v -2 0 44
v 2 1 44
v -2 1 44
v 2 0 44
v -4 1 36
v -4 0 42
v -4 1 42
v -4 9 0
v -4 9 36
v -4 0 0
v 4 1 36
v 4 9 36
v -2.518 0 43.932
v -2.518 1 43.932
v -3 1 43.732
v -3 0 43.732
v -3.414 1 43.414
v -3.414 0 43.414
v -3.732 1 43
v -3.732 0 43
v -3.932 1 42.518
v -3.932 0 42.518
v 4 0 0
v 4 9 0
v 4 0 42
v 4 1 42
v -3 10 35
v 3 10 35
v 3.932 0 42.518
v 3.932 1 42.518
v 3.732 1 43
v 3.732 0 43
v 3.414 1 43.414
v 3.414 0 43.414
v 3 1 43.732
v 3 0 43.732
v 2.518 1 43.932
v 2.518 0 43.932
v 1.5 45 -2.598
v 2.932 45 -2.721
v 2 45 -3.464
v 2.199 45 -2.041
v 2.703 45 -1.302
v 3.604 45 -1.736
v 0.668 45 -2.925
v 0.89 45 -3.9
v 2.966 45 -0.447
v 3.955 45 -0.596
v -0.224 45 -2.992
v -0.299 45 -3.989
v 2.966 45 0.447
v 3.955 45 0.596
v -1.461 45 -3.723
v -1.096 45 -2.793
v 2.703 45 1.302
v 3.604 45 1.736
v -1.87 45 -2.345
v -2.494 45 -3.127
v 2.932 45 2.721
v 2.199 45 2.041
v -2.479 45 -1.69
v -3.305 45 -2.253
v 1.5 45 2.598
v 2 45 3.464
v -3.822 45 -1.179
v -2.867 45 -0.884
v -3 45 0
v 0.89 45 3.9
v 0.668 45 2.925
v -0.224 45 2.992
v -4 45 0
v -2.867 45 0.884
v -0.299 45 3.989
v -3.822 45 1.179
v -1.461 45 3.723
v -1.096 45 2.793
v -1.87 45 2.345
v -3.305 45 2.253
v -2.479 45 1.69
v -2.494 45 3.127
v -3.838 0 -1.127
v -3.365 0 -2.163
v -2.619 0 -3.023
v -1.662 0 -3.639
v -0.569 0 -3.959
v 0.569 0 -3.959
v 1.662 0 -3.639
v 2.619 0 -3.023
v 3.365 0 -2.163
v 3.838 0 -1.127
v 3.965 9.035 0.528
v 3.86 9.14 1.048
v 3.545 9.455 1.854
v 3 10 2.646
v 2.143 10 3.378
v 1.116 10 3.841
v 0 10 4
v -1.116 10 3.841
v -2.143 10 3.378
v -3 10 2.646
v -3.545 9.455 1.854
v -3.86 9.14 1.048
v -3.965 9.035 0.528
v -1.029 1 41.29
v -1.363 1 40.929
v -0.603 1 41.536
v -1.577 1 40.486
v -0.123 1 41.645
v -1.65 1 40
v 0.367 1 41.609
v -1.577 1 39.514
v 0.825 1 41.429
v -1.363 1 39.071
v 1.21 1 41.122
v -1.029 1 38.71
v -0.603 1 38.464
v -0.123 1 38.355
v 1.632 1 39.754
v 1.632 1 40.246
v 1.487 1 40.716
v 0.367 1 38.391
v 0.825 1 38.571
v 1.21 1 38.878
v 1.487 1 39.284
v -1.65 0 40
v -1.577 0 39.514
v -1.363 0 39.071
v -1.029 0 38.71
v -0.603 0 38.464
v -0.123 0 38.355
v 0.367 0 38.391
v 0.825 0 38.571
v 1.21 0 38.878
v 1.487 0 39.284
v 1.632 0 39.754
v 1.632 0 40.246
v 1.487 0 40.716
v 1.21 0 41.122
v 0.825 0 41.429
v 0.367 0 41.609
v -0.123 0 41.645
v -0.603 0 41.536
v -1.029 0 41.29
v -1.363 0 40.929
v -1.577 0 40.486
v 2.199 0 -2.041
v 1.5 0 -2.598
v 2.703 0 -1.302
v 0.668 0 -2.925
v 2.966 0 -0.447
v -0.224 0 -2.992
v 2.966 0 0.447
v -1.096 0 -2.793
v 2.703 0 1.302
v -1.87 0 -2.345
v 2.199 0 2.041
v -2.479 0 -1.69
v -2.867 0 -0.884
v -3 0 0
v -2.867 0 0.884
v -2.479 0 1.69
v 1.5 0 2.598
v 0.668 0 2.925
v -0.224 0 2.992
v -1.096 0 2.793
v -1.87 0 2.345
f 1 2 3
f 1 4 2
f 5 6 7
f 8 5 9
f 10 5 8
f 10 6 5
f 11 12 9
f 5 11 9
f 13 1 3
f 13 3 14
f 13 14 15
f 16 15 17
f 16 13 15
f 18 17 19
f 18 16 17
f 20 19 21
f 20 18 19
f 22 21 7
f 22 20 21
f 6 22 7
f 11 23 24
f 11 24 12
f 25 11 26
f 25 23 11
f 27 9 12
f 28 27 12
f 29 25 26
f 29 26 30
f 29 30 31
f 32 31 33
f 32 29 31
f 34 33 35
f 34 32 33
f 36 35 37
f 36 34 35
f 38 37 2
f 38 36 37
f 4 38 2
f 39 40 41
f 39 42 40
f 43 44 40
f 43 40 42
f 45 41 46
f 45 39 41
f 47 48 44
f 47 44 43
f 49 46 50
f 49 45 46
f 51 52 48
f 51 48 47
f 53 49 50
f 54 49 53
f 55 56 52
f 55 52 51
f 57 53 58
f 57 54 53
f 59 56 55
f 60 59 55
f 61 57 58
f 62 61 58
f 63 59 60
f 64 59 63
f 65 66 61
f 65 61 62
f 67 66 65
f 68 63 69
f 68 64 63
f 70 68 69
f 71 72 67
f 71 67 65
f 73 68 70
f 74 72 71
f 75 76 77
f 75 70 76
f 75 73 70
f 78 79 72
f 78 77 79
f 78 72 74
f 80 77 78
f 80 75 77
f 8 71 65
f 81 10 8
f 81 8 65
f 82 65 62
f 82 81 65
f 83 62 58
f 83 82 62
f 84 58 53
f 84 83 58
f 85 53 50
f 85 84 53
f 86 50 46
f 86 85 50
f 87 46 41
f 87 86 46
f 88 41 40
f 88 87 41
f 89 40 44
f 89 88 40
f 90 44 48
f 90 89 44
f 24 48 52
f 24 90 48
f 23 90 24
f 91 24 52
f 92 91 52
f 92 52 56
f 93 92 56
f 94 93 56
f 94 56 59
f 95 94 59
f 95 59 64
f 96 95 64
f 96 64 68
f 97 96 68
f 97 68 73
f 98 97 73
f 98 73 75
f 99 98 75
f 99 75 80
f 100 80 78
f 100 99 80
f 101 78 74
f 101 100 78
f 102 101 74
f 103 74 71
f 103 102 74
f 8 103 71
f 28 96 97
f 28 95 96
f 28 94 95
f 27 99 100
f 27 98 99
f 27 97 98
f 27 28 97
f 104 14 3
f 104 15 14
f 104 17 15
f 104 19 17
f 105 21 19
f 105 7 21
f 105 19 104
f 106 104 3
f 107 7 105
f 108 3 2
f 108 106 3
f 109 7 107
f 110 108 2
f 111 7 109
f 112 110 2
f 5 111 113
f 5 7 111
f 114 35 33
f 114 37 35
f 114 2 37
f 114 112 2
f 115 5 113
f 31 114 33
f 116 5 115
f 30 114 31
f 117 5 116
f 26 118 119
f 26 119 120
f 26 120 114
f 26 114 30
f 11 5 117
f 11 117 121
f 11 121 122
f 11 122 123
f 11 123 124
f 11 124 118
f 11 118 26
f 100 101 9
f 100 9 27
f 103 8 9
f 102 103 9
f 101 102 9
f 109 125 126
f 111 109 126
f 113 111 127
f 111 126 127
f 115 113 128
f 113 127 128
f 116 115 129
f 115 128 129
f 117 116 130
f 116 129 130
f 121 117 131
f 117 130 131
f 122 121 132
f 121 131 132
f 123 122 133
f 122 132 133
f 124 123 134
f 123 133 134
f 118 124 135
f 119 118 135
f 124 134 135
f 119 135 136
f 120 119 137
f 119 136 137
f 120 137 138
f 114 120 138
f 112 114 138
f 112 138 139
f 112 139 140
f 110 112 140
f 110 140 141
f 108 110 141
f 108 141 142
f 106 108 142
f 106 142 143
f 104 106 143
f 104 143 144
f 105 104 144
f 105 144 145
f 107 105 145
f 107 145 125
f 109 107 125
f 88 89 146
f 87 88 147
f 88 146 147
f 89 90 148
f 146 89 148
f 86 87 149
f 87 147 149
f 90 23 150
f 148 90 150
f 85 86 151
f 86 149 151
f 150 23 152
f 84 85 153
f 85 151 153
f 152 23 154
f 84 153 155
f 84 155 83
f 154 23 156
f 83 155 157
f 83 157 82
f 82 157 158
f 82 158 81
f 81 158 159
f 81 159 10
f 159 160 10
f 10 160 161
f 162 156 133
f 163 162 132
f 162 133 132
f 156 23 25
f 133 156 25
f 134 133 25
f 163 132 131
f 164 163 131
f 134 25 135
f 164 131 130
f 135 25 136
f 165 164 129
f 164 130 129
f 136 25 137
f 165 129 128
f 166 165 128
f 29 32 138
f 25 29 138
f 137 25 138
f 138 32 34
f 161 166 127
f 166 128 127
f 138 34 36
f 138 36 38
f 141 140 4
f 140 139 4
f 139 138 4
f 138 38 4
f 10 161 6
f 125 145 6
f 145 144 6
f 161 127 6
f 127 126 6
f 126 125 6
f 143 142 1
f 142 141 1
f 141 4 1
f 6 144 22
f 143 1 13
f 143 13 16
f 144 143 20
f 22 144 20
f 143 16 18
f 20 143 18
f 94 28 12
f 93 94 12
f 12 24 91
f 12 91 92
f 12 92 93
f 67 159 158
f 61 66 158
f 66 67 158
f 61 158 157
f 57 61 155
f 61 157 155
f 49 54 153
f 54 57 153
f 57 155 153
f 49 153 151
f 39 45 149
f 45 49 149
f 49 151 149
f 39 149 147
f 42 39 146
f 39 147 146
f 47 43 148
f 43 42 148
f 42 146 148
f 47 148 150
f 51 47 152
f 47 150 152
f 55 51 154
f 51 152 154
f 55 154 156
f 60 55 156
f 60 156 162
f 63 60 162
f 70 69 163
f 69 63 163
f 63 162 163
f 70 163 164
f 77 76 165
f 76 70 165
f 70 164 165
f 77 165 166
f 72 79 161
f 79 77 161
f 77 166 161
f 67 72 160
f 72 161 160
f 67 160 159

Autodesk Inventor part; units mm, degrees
ref_plane "YZ Plane" through (0, 0, 0) normal (1, 0, 0) x (0, 1, 0)
ref_plane "XZ Plane" through (0, 0, 0) normal (0, 1, 0) x (-1, 0, 0)
ref_plane "XY Plane" through (0, 0, 0) normal (0, 0, 1) x (1, 0, 0)
sketch "Sketch1" plane through (0, 0, 0) normal (0, 1, 0) x (-1, 0, 0)
  circle A0 centre (0, 0) radius 3
  circle A1 centre (0, 0) radius 4
  dimension "d0" = 6
  dimension "d1" = 8
extrude "Extrusion1" add sketch "Sketch1" along normal blind 45
sketch "Sketch2" plane through (0, 0, 0) normal (0, 1, 0) x (-1, 0, 0)
  circle A0 centre (0, 0) radius 4 projected
  line L0 (-4, 0) -> (-4, 42)
  line L1 (-2, 44) -> (2, 44)
  line L2 (4, 42) -> (4, 0)
  arc A1 (-2, 44) -> (-4, 42) centre (-2, 42) ccw
  arc A2 (4, 42) -> (2, 44) centre (2, 42) ccw
  circle A3 centre (0, 40) radius 1.65
  point P0 (-4, 44)
  point P1 (4, 44)
  dimension "d4" = 44
  dimension "d5" = 8
  dimension "d6" = 2
  dimension "d10" = 3.3
extrude "Extrusion2" add sketch "Sketch2" along normal blind 10 contours A0 L0 A1 L1 A2 L2
chamfer "Chamfer1" distance 1 angle 45 5 edges at (4, 10, 21) (3.4142, 10, 43.4142) (0, 10, 44) (-3.4142, 10, 43.4142) (-4, 10, 21)
sketch "Sketch4" plane through (0, 10, 0) normal (0, 1, 0) x (1, 0, 0)
  circle A0 centre (0, -40) radius 1.65 projected
  line L0 (4, -36) -> (-4, -36)
  line L1 (-4, -36) -> (-4, -44)
  line L2 (-4, -44) -> (4, -44)
  line L3 (4, -44) -> (4, -36)
  line L4 (4, -36) -> (-4, -44) construction
  line L5 (-4, -36) -> (4, -44) construction
  point P0 (0, 0)
  point P1 (-2, -44)
  point P2 (-4, -42)
extrude "Extrusion3" cut sketch "Sketch4" against normal blind 9
chamfer "Chamfer4" distance 1 angle 45 1 edges at (0, 10, 36)
properties part number "Rod Spacer" material "ABS Plastic"
